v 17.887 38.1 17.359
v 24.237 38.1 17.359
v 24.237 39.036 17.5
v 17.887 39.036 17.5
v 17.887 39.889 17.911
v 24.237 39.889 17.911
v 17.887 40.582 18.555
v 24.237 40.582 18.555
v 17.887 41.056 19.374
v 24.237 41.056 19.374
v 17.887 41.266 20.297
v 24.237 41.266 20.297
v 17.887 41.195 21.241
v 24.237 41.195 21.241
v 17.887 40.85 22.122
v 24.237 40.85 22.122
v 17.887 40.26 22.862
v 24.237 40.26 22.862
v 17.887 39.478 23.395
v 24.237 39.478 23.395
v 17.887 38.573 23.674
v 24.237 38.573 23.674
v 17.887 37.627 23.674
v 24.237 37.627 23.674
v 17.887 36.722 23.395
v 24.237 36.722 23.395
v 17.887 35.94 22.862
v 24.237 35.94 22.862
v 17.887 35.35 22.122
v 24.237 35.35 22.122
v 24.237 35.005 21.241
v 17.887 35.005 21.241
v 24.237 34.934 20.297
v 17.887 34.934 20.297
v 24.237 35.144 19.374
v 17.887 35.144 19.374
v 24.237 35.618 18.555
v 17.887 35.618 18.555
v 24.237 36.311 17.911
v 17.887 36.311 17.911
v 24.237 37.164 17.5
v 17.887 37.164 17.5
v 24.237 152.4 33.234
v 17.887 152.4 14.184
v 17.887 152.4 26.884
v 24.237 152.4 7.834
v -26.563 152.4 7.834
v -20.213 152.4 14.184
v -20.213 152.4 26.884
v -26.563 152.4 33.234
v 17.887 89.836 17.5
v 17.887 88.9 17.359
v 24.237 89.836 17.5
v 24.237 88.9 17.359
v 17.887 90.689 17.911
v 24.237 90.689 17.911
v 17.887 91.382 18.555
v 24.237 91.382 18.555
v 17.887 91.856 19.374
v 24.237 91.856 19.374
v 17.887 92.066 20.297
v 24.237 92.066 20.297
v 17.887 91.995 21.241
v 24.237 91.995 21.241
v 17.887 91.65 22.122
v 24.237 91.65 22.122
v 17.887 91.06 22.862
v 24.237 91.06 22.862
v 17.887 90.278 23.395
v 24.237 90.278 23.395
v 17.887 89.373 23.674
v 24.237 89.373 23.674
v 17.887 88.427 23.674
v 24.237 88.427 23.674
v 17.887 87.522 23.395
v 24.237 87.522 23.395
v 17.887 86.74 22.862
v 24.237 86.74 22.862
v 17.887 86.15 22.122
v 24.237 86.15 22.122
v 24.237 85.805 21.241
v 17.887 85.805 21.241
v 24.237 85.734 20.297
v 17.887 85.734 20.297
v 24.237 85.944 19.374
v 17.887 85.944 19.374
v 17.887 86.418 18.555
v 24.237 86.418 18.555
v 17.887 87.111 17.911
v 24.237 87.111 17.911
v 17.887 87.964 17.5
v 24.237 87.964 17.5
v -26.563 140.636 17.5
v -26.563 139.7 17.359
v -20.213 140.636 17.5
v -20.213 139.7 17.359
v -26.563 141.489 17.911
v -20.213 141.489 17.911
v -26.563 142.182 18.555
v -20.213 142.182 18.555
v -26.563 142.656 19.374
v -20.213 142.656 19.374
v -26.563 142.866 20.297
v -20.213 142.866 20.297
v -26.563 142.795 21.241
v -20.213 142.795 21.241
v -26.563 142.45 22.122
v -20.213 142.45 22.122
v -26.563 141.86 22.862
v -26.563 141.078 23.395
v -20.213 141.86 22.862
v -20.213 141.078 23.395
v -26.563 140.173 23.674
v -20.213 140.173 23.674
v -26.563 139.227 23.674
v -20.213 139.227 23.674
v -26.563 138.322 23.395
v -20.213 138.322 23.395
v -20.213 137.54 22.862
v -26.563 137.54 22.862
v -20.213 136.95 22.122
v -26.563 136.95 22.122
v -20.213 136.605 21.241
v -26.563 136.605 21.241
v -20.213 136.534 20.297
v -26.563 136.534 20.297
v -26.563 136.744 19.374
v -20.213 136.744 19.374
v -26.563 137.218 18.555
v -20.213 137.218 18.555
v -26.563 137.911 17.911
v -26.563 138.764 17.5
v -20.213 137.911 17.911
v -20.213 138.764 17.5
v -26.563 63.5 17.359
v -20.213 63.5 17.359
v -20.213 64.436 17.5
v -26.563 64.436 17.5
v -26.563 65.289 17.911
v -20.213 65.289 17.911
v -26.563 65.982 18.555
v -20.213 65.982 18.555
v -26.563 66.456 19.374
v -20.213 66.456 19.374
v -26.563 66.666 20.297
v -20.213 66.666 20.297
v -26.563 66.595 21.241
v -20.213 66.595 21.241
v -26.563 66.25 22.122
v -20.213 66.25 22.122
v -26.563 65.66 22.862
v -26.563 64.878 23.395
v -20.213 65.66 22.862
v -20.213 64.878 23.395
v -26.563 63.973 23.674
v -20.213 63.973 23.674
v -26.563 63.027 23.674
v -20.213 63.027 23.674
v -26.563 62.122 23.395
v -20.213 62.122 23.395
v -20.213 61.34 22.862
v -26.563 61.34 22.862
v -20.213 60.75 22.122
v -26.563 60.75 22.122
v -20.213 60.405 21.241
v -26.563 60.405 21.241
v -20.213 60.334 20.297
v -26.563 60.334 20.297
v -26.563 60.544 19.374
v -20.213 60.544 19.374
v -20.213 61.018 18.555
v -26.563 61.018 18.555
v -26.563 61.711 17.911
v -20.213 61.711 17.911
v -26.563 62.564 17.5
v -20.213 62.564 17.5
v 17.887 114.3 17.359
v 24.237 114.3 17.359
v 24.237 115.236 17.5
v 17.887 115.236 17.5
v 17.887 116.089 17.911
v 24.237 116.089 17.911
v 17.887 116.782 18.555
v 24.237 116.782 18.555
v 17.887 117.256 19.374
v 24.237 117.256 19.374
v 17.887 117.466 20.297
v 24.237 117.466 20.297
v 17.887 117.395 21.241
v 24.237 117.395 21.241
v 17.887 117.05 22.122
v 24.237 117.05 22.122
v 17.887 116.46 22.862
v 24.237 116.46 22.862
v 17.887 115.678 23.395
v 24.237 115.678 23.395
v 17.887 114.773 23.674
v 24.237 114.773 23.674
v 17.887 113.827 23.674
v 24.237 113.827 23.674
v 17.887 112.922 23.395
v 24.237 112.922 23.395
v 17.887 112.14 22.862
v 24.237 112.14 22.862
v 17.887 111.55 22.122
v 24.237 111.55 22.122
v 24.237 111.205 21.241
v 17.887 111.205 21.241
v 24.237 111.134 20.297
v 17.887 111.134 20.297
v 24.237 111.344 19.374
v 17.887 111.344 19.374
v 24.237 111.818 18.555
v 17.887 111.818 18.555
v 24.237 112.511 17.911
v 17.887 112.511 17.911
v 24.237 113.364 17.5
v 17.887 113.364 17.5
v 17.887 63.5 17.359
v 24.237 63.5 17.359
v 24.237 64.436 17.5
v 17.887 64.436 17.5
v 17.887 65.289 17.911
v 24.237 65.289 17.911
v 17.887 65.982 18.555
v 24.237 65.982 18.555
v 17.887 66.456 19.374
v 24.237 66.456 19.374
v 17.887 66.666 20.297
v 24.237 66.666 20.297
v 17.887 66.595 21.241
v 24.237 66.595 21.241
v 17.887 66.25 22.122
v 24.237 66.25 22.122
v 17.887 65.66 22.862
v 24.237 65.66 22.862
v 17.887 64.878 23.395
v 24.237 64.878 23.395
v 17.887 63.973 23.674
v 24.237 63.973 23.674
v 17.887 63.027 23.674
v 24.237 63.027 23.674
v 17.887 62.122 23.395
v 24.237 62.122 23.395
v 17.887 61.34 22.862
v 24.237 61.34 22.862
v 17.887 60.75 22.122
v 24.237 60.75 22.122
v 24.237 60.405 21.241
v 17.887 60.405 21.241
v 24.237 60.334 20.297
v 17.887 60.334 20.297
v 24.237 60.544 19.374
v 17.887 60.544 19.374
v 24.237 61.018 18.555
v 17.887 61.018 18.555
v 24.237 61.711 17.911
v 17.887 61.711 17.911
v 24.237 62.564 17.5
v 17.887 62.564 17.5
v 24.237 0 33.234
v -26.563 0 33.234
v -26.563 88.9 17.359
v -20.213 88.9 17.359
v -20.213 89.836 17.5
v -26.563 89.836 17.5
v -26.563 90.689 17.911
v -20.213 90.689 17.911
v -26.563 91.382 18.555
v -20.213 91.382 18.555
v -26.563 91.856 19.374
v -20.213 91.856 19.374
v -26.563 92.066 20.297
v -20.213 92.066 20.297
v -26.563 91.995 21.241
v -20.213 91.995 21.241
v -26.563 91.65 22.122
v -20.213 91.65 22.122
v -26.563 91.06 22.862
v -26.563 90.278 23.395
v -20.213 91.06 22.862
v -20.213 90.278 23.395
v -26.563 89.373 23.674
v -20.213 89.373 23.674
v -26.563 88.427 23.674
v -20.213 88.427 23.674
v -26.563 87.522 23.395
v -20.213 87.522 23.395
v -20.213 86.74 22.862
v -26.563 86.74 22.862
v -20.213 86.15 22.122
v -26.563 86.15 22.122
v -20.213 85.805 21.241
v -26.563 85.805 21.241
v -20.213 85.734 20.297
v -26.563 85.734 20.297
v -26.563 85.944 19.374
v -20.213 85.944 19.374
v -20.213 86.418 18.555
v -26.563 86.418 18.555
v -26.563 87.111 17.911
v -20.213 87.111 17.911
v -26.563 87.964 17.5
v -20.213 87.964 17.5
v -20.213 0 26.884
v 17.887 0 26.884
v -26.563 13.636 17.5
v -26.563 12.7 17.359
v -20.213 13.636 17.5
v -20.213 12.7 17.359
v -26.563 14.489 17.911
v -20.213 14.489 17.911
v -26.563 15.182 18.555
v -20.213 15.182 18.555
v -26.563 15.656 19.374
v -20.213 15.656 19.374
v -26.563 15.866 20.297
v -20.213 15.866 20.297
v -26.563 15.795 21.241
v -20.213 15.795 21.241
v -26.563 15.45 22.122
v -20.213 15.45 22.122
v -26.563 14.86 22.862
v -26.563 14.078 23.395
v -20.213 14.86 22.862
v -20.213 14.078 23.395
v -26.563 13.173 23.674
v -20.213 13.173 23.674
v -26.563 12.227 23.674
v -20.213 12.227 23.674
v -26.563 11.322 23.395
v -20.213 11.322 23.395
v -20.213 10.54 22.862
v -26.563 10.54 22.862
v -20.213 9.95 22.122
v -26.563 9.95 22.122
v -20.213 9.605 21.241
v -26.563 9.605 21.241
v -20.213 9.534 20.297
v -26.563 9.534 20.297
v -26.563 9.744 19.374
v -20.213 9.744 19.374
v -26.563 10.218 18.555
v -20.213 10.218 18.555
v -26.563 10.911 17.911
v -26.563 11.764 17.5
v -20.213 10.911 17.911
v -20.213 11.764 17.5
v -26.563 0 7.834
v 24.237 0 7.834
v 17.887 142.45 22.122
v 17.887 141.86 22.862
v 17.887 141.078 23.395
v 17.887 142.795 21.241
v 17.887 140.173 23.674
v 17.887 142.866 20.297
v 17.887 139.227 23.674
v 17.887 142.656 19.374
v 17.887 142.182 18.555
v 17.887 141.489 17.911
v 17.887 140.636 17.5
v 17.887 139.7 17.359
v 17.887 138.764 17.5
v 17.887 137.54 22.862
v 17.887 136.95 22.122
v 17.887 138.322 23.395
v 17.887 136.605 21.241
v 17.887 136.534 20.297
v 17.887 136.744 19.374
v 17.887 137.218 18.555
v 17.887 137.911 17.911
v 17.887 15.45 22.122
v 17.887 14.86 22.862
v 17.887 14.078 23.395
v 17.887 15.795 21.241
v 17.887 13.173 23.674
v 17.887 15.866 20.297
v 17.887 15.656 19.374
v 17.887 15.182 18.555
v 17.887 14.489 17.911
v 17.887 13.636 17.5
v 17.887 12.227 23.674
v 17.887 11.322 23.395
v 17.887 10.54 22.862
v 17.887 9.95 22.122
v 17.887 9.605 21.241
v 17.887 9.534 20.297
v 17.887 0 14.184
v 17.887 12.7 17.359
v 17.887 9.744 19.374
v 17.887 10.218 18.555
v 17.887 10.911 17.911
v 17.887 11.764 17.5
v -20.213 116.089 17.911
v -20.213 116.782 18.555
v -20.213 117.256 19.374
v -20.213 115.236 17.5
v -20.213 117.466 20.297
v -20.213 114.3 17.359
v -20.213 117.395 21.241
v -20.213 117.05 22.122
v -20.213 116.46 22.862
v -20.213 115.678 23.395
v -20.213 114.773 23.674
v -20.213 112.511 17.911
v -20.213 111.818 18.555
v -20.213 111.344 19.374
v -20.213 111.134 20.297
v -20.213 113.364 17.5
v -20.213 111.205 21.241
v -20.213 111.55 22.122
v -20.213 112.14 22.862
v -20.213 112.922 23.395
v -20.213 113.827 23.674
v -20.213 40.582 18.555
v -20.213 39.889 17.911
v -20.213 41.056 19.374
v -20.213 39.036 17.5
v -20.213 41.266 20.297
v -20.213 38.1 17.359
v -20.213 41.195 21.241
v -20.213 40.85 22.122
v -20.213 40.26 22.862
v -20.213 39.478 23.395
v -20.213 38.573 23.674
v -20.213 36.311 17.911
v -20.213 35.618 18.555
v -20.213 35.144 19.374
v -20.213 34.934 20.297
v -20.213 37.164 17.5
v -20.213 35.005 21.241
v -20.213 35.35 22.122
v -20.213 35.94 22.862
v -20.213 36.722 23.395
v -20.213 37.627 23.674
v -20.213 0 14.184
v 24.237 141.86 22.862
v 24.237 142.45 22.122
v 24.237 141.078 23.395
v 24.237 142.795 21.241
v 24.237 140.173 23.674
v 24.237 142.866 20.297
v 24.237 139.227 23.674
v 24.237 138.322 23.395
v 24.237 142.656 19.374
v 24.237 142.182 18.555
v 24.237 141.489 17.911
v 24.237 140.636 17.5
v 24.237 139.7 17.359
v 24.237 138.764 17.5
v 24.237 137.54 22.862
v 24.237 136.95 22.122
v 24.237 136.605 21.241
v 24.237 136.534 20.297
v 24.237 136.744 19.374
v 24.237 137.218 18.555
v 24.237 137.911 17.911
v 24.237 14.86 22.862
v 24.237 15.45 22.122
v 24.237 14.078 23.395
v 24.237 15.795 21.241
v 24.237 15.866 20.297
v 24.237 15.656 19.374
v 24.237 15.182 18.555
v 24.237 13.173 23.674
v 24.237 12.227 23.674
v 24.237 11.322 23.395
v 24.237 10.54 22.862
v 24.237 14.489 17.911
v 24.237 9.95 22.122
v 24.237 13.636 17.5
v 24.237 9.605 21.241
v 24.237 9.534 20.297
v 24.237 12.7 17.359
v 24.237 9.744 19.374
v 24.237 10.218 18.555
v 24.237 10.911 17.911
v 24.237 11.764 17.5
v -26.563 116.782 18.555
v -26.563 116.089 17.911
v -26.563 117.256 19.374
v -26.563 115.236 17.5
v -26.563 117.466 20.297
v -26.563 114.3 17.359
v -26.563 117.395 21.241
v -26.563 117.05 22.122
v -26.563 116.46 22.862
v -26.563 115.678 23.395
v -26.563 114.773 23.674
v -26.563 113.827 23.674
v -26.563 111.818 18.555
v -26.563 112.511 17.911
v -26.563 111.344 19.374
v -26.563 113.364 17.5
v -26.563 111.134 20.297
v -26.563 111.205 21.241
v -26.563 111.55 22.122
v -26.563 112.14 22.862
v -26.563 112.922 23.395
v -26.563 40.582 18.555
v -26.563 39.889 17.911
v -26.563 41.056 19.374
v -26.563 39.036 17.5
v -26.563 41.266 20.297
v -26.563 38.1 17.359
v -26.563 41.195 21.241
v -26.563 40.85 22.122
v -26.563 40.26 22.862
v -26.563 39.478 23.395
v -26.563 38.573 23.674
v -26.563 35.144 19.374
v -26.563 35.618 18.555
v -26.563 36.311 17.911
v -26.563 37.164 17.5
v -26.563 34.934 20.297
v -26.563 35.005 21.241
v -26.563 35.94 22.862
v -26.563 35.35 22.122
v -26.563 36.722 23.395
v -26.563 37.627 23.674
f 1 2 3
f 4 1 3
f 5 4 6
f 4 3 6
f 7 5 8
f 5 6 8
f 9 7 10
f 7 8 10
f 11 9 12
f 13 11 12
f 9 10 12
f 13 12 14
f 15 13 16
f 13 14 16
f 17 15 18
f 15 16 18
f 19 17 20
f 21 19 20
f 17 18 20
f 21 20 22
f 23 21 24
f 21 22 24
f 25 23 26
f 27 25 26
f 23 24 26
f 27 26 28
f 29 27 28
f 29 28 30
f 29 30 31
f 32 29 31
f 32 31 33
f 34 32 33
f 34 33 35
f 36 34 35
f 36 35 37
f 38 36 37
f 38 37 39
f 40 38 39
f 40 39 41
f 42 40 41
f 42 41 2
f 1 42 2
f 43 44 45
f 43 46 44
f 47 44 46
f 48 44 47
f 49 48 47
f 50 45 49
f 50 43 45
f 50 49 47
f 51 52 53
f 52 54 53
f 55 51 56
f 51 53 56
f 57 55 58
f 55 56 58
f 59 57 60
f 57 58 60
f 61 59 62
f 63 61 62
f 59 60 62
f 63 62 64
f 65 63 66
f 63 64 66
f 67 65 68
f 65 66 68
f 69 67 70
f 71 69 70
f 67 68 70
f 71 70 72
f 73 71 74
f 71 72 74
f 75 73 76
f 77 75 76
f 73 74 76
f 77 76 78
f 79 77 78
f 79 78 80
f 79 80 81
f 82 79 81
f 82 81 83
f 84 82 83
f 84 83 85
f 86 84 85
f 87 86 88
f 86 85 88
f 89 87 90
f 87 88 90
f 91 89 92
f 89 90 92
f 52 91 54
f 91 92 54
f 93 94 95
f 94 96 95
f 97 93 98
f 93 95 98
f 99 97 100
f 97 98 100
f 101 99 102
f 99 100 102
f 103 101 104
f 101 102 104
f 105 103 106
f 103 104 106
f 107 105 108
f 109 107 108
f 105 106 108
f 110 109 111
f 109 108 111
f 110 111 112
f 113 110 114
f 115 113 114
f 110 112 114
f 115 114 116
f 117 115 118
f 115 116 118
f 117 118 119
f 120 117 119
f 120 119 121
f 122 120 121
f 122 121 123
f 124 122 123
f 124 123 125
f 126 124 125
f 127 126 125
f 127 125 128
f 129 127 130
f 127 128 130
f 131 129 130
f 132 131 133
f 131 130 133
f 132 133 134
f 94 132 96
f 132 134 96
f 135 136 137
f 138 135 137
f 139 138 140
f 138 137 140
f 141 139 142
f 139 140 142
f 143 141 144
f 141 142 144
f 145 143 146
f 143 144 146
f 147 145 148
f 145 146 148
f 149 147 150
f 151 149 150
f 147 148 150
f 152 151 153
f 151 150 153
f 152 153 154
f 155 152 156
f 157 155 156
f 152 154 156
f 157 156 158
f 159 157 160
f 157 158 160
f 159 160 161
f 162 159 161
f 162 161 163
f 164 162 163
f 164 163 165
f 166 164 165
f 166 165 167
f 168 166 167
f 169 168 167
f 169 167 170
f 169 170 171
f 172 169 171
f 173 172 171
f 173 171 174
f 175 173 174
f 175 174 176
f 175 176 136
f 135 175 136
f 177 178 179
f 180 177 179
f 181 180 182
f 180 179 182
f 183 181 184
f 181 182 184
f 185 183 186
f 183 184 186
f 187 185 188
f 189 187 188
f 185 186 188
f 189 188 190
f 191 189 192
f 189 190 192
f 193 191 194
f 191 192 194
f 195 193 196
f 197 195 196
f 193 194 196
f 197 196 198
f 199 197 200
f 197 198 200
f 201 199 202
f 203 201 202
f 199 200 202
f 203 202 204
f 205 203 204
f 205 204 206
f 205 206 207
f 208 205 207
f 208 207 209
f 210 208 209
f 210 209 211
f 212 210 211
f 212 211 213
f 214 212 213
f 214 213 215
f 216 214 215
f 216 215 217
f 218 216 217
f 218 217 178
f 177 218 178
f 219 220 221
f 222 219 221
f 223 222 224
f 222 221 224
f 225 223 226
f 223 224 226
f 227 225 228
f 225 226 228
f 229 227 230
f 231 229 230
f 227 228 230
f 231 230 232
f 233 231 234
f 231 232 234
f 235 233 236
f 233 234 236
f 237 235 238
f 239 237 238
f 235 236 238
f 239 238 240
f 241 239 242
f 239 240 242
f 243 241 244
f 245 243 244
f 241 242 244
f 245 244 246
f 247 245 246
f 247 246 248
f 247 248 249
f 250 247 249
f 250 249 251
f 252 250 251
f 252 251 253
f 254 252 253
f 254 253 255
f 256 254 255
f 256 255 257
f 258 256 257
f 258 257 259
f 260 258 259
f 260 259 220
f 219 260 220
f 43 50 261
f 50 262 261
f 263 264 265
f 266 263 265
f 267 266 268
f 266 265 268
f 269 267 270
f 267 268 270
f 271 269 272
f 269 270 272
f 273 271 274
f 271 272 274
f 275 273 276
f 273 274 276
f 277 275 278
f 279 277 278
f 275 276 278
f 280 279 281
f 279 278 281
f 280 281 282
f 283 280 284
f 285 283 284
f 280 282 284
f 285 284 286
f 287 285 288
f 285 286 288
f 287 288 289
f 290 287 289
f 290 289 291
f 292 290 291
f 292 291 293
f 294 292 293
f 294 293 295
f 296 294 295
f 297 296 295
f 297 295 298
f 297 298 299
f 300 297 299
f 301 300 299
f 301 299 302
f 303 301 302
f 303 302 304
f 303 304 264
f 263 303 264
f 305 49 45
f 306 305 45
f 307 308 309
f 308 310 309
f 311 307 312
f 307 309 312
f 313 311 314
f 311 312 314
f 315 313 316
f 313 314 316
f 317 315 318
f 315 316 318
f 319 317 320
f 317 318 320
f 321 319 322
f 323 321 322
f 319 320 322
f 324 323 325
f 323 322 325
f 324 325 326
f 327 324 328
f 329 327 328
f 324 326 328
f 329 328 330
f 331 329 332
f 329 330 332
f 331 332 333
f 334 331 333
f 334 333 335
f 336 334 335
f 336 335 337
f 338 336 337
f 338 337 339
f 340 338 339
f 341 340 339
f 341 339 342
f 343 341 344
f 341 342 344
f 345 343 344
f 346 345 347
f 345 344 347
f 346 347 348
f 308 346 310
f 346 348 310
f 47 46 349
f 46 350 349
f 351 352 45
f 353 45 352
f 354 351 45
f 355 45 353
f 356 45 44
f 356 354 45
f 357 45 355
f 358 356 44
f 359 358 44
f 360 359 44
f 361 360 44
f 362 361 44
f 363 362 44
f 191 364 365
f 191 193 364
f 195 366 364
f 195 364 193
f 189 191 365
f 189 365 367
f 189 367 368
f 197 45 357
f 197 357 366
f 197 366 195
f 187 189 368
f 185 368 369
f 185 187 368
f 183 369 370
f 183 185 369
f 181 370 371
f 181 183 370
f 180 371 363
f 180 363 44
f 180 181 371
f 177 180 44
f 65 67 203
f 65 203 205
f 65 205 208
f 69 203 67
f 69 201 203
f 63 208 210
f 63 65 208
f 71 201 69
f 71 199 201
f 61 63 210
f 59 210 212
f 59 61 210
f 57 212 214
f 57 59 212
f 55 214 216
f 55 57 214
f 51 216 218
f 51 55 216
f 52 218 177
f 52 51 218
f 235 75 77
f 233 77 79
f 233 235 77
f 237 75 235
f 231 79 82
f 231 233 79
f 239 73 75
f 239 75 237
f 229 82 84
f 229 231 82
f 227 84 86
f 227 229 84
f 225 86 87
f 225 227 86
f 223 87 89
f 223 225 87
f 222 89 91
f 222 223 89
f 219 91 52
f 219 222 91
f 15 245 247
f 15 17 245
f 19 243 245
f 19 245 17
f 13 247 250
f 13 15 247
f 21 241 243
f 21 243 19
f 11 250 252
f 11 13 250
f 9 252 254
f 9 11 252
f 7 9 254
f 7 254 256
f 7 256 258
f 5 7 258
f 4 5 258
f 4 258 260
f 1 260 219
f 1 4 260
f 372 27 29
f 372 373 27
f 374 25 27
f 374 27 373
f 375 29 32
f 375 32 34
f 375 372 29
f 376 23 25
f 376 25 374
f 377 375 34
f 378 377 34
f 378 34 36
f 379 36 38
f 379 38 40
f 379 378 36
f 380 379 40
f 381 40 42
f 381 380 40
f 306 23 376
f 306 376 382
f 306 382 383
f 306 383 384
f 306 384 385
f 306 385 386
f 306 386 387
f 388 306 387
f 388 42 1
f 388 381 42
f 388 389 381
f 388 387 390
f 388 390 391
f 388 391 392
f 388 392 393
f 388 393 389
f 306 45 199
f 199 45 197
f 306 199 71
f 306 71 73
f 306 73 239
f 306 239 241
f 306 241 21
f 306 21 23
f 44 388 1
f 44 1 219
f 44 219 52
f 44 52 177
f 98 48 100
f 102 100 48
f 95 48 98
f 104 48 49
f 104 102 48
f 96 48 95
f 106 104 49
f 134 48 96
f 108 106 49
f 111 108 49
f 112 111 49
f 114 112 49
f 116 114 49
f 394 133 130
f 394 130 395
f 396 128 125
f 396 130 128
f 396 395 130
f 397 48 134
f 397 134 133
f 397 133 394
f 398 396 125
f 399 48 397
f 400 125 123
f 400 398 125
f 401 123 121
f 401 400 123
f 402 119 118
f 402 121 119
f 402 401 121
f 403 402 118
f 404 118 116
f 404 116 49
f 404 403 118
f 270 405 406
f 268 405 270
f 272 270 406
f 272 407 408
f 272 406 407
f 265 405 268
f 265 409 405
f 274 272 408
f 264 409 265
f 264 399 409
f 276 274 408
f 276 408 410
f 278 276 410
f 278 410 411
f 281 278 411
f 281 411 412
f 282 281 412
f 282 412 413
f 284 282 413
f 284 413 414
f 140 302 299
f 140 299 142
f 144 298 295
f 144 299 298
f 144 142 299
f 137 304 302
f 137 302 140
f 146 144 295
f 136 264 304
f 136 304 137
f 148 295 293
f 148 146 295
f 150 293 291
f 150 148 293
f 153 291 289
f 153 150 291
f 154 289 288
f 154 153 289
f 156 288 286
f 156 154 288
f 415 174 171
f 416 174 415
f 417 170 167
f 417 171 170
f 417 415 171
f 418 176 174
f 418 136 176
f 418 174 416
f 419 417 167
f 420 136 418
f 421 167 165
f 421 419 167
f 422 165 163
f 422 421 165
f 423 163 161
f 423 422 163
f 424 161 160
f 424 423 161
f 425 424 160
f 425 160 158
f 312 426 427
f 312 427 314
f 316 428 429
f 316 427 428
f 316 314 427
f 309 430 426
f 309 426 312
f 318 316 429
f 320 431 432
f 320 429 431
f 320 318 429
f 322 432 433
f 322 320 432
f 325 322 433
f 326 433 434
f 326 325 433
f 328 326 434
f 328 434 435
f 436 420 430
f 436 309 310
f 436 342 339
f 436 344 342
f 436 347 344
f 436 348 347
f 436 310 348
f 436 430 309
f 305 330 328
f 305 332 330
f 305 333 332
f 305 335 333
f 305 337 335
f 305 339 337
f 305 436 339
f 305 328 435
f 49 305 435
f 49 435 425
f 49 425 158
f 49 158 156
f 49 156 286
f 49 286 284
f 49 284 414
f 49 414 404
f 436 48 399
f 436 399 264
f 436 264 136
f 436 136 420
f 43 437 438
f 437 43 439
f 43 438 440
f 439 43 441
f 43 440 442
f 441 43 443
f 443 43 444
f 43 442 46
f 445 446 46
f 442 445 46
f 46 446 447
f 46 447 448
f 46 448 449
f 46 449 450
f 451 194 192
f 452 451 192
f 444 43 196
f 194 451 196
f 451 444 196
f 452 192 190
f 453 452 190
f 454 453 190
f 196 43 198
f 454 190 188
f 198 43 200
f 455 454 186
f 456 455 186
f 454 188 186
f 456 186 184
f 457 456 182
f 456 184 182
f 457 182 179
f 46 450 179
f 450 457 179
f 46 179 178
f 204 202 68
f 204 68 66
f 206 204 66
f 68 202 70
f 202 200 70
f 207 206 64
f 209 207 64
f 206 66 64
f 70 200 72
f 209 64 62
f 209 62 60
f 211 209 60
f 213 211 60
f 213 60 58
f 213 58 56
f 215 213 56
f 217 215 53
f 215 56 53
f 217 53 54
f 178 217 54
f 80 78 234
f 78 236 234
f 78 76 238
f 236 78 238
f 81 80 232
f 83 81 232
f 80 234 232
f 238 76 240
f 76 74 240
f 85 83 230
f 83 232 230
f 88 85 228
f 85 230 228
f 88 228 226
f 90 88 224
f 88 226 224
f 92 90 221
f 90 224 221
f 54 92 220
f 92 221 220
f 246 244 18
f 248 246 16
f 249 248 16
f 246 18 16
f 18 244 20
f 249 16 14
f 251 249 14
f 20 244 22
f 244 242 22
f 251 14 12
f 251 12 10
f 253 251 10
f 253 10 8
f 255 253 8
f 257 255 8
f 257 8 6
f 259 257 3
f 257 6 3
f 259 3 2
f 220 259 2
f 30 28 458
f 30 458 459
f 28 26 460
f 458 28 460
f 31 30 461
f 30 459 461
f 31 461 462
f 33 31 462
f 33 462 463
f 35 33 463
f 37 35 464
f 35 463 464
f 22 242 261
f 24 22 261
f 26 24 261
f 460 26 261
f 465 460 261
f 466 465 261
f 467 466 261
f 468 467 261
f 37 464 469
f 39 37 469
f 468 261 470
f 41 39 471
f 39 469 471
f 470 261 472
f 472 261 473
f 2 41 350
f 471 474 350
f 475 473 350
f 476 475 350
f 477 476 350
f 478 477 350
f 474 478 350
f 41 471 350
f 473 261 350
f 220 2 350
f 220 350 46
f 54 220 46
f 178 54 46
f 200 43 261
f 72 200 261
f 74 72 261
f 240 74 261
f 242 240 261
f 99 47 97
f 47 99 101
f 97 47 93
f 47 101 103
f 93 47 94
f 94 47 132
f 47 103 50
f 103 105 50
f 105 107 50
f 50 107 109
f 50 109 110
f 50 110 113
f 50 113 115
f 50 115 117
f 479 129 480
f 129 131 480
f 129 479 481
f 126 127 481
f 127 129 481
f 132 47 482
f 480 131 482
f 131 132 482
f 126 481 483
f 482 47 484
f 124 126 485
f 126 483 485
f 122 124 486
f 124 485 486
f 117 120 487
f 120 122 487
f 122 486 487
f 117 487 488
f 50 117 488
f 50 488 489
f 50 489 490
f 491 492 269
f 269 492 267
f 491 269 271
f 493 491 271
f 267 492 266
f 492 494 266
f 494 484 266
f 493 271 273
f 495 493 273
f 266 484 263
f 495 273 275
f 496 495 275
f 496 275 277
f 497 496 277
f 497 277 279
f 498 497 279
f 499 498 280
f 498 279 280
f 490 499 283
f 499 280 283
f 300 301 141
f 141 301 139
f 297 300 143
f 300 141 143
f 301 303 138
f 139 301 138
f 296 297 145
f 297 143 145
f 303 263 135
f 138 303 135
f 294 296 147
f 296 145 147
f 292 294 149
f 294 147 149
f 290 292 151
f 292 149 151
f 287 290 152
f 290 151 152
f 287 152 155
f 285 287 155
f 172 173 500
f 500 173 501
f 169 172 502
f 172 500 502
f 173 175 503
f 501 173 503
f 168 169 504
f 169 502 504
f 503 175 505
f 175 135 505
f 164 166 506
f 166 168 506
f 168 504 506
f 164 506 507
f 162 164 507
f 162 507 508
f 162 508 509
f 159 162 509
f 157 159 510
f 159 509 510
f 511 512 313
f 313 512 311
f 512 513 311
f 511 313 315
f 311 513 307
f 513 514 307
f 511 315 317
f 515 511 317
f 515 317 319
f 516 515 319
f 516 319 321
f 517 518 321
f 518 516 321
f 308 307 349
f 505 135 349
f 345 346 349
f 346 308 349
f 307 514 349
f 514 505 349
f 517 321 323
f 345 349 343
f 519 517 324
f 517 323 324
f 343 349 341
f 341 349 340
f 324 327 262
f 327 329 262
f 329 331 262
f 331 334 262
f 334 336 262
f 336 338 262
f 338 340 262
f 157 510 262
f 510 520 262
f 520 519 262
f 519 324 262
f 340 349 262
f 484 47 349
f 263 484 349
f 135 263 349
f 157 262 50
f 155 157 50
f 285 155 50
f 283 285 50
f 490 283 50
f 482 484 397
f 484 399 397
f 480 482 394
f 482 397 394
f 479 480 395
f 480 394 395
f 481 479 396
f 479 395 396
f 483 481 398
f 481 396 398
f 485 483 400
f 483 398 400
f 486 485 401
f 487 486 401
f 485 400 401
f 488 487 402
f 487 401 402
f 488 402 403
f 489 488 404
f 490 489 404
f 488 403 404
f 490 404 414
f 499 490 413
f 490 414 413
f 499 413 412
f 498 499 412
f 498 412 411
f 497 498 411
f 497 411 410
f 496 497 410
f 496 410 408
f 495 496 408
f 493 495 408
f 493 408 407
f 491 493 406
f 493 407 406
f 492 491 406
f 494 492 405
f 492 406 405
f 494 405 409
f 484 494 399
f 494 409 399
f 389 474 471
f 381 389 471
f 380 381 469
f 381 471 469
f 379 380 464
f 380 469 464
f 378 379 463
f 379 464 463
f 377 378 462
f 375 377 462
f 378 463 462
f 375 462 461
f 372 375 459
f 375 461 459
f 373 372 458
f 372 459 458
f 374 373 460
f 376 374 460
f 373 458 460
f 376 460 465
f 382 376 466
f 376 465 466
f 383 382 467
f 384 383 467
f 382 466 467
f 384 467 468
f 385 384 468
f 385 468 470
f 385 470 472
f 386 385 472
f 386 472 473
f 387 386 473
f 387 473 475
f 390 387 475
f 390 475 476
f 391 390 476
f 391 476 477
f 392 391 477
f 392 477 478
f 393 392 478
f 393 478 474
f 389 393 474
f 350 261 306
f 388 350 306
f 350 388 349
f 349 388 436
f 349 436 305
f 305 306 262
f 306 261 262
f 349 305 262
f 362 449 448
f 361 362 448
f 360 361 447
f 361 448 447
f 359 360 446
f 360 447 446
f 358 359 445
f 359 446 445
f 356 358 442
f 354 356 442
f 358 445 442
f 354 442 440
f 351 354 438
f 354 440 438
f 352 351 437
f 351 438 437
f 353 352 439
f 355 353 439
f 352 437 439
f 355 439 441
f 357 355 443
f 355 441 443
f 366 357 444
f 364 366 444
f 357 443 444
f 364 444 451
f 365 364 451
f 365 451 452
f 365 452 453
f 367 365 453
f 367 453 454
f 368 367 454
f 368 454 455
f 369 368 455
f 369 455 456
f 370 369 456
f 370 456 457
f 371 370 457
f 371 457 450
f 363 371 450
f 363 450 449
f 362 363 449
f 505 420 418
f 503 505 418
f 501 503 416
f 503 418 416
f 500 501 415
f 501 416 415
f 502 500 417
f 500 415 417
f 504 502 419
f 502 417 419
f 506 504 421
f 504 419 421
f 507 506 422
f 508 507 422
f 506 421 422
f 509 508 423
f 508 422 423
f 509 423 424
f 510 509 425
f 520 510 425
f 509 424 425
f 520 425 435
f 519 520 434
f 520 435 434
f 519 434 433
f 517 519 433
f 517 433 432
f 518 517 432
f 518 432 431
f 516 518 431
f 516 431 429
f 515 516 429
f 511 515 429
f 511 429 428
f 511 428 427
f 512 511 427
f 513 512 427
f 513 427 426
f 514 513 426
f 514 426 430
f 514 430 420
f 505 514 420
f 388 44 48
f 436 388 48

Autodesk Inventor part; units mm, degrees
ref_plane "YZ Plane" through (0, 0, 0) normal (1, 0, 0) x (0, 1, 0)
ref_plane "XZ Plane" through (0, 0, 0) normal (0, 1, 0) x (-1, 0, 0)
ref_plane "XY Plane" through (0, 0, 0) normal (0, 0, 1) x (1, 0, 0)
sketch "Sketch1" plane through (0, 0, 0) normal (0, 1, 0) x (-1, 0, 0)
  line L0 (-24.2371, 7.8342) -> (26.5629, 7.8342)
  line L1 (26.5629, 7.8342) -> (26.5629, 33.2342)
  line L2 (26.5629, 33.2342) -> (-24.2371, 33.2342)
  line L3 (-24.2371, 33.2342) -> (-24.2371, 7.8342)
  line L4 (-17.8871, 14.1842) -> (20.2129, 14.1842)
  line L5 (20.2129, 14.1842) -> (20.2129, 26.8842)
  line L6 (20.2129, 26.8842) -> (-17.8871, 26.8842)
  line L7 (-17.8871, 26.8842) -> (-17.8871, 14.1842)
  point P0 (0, 0)
  dimension "d0" = 50.8
  dimension "d1" = 25.4
  dimension "d2" = 6.35
extrude "Extrusion1" add sketch "Sketch1" along normal blind 152.4
sketch "Sketch2" plane through (24.2371, 0, 33.2342) normal (1, 0, 0) x (0, 0, -1)
  line L0 (19.05, 0) -> (6.35, 0) projected
  line L1 (12.7, 0) -> (12.7, 152.4) construction
  line L2 (6.35, 152.4) -> (19.05, 152.4) projected
  circle A0 centre (12.7, 12.7) radius 3.175
  circle A1 centre (12.7, 38.1) radius 3.175
  circle A2 centre (12.7, 63.5) radius 3.175
  circle A3 centre (12.7, 88.9) radius 3.175
  circle A4 centre (12.7, 114.3) radius 3.175
  circle A5 centre (12.7, 139.7) radius 3.175
  point P0 (33.2342, 0)
  dimension "d5" = 6.35
  dimension "d6" = 12.7
  dimension "d9" = 25.4
extrude "Extrusion2" cut sketch "Sketch2" against normal through all
properties part number "Front Frame"
